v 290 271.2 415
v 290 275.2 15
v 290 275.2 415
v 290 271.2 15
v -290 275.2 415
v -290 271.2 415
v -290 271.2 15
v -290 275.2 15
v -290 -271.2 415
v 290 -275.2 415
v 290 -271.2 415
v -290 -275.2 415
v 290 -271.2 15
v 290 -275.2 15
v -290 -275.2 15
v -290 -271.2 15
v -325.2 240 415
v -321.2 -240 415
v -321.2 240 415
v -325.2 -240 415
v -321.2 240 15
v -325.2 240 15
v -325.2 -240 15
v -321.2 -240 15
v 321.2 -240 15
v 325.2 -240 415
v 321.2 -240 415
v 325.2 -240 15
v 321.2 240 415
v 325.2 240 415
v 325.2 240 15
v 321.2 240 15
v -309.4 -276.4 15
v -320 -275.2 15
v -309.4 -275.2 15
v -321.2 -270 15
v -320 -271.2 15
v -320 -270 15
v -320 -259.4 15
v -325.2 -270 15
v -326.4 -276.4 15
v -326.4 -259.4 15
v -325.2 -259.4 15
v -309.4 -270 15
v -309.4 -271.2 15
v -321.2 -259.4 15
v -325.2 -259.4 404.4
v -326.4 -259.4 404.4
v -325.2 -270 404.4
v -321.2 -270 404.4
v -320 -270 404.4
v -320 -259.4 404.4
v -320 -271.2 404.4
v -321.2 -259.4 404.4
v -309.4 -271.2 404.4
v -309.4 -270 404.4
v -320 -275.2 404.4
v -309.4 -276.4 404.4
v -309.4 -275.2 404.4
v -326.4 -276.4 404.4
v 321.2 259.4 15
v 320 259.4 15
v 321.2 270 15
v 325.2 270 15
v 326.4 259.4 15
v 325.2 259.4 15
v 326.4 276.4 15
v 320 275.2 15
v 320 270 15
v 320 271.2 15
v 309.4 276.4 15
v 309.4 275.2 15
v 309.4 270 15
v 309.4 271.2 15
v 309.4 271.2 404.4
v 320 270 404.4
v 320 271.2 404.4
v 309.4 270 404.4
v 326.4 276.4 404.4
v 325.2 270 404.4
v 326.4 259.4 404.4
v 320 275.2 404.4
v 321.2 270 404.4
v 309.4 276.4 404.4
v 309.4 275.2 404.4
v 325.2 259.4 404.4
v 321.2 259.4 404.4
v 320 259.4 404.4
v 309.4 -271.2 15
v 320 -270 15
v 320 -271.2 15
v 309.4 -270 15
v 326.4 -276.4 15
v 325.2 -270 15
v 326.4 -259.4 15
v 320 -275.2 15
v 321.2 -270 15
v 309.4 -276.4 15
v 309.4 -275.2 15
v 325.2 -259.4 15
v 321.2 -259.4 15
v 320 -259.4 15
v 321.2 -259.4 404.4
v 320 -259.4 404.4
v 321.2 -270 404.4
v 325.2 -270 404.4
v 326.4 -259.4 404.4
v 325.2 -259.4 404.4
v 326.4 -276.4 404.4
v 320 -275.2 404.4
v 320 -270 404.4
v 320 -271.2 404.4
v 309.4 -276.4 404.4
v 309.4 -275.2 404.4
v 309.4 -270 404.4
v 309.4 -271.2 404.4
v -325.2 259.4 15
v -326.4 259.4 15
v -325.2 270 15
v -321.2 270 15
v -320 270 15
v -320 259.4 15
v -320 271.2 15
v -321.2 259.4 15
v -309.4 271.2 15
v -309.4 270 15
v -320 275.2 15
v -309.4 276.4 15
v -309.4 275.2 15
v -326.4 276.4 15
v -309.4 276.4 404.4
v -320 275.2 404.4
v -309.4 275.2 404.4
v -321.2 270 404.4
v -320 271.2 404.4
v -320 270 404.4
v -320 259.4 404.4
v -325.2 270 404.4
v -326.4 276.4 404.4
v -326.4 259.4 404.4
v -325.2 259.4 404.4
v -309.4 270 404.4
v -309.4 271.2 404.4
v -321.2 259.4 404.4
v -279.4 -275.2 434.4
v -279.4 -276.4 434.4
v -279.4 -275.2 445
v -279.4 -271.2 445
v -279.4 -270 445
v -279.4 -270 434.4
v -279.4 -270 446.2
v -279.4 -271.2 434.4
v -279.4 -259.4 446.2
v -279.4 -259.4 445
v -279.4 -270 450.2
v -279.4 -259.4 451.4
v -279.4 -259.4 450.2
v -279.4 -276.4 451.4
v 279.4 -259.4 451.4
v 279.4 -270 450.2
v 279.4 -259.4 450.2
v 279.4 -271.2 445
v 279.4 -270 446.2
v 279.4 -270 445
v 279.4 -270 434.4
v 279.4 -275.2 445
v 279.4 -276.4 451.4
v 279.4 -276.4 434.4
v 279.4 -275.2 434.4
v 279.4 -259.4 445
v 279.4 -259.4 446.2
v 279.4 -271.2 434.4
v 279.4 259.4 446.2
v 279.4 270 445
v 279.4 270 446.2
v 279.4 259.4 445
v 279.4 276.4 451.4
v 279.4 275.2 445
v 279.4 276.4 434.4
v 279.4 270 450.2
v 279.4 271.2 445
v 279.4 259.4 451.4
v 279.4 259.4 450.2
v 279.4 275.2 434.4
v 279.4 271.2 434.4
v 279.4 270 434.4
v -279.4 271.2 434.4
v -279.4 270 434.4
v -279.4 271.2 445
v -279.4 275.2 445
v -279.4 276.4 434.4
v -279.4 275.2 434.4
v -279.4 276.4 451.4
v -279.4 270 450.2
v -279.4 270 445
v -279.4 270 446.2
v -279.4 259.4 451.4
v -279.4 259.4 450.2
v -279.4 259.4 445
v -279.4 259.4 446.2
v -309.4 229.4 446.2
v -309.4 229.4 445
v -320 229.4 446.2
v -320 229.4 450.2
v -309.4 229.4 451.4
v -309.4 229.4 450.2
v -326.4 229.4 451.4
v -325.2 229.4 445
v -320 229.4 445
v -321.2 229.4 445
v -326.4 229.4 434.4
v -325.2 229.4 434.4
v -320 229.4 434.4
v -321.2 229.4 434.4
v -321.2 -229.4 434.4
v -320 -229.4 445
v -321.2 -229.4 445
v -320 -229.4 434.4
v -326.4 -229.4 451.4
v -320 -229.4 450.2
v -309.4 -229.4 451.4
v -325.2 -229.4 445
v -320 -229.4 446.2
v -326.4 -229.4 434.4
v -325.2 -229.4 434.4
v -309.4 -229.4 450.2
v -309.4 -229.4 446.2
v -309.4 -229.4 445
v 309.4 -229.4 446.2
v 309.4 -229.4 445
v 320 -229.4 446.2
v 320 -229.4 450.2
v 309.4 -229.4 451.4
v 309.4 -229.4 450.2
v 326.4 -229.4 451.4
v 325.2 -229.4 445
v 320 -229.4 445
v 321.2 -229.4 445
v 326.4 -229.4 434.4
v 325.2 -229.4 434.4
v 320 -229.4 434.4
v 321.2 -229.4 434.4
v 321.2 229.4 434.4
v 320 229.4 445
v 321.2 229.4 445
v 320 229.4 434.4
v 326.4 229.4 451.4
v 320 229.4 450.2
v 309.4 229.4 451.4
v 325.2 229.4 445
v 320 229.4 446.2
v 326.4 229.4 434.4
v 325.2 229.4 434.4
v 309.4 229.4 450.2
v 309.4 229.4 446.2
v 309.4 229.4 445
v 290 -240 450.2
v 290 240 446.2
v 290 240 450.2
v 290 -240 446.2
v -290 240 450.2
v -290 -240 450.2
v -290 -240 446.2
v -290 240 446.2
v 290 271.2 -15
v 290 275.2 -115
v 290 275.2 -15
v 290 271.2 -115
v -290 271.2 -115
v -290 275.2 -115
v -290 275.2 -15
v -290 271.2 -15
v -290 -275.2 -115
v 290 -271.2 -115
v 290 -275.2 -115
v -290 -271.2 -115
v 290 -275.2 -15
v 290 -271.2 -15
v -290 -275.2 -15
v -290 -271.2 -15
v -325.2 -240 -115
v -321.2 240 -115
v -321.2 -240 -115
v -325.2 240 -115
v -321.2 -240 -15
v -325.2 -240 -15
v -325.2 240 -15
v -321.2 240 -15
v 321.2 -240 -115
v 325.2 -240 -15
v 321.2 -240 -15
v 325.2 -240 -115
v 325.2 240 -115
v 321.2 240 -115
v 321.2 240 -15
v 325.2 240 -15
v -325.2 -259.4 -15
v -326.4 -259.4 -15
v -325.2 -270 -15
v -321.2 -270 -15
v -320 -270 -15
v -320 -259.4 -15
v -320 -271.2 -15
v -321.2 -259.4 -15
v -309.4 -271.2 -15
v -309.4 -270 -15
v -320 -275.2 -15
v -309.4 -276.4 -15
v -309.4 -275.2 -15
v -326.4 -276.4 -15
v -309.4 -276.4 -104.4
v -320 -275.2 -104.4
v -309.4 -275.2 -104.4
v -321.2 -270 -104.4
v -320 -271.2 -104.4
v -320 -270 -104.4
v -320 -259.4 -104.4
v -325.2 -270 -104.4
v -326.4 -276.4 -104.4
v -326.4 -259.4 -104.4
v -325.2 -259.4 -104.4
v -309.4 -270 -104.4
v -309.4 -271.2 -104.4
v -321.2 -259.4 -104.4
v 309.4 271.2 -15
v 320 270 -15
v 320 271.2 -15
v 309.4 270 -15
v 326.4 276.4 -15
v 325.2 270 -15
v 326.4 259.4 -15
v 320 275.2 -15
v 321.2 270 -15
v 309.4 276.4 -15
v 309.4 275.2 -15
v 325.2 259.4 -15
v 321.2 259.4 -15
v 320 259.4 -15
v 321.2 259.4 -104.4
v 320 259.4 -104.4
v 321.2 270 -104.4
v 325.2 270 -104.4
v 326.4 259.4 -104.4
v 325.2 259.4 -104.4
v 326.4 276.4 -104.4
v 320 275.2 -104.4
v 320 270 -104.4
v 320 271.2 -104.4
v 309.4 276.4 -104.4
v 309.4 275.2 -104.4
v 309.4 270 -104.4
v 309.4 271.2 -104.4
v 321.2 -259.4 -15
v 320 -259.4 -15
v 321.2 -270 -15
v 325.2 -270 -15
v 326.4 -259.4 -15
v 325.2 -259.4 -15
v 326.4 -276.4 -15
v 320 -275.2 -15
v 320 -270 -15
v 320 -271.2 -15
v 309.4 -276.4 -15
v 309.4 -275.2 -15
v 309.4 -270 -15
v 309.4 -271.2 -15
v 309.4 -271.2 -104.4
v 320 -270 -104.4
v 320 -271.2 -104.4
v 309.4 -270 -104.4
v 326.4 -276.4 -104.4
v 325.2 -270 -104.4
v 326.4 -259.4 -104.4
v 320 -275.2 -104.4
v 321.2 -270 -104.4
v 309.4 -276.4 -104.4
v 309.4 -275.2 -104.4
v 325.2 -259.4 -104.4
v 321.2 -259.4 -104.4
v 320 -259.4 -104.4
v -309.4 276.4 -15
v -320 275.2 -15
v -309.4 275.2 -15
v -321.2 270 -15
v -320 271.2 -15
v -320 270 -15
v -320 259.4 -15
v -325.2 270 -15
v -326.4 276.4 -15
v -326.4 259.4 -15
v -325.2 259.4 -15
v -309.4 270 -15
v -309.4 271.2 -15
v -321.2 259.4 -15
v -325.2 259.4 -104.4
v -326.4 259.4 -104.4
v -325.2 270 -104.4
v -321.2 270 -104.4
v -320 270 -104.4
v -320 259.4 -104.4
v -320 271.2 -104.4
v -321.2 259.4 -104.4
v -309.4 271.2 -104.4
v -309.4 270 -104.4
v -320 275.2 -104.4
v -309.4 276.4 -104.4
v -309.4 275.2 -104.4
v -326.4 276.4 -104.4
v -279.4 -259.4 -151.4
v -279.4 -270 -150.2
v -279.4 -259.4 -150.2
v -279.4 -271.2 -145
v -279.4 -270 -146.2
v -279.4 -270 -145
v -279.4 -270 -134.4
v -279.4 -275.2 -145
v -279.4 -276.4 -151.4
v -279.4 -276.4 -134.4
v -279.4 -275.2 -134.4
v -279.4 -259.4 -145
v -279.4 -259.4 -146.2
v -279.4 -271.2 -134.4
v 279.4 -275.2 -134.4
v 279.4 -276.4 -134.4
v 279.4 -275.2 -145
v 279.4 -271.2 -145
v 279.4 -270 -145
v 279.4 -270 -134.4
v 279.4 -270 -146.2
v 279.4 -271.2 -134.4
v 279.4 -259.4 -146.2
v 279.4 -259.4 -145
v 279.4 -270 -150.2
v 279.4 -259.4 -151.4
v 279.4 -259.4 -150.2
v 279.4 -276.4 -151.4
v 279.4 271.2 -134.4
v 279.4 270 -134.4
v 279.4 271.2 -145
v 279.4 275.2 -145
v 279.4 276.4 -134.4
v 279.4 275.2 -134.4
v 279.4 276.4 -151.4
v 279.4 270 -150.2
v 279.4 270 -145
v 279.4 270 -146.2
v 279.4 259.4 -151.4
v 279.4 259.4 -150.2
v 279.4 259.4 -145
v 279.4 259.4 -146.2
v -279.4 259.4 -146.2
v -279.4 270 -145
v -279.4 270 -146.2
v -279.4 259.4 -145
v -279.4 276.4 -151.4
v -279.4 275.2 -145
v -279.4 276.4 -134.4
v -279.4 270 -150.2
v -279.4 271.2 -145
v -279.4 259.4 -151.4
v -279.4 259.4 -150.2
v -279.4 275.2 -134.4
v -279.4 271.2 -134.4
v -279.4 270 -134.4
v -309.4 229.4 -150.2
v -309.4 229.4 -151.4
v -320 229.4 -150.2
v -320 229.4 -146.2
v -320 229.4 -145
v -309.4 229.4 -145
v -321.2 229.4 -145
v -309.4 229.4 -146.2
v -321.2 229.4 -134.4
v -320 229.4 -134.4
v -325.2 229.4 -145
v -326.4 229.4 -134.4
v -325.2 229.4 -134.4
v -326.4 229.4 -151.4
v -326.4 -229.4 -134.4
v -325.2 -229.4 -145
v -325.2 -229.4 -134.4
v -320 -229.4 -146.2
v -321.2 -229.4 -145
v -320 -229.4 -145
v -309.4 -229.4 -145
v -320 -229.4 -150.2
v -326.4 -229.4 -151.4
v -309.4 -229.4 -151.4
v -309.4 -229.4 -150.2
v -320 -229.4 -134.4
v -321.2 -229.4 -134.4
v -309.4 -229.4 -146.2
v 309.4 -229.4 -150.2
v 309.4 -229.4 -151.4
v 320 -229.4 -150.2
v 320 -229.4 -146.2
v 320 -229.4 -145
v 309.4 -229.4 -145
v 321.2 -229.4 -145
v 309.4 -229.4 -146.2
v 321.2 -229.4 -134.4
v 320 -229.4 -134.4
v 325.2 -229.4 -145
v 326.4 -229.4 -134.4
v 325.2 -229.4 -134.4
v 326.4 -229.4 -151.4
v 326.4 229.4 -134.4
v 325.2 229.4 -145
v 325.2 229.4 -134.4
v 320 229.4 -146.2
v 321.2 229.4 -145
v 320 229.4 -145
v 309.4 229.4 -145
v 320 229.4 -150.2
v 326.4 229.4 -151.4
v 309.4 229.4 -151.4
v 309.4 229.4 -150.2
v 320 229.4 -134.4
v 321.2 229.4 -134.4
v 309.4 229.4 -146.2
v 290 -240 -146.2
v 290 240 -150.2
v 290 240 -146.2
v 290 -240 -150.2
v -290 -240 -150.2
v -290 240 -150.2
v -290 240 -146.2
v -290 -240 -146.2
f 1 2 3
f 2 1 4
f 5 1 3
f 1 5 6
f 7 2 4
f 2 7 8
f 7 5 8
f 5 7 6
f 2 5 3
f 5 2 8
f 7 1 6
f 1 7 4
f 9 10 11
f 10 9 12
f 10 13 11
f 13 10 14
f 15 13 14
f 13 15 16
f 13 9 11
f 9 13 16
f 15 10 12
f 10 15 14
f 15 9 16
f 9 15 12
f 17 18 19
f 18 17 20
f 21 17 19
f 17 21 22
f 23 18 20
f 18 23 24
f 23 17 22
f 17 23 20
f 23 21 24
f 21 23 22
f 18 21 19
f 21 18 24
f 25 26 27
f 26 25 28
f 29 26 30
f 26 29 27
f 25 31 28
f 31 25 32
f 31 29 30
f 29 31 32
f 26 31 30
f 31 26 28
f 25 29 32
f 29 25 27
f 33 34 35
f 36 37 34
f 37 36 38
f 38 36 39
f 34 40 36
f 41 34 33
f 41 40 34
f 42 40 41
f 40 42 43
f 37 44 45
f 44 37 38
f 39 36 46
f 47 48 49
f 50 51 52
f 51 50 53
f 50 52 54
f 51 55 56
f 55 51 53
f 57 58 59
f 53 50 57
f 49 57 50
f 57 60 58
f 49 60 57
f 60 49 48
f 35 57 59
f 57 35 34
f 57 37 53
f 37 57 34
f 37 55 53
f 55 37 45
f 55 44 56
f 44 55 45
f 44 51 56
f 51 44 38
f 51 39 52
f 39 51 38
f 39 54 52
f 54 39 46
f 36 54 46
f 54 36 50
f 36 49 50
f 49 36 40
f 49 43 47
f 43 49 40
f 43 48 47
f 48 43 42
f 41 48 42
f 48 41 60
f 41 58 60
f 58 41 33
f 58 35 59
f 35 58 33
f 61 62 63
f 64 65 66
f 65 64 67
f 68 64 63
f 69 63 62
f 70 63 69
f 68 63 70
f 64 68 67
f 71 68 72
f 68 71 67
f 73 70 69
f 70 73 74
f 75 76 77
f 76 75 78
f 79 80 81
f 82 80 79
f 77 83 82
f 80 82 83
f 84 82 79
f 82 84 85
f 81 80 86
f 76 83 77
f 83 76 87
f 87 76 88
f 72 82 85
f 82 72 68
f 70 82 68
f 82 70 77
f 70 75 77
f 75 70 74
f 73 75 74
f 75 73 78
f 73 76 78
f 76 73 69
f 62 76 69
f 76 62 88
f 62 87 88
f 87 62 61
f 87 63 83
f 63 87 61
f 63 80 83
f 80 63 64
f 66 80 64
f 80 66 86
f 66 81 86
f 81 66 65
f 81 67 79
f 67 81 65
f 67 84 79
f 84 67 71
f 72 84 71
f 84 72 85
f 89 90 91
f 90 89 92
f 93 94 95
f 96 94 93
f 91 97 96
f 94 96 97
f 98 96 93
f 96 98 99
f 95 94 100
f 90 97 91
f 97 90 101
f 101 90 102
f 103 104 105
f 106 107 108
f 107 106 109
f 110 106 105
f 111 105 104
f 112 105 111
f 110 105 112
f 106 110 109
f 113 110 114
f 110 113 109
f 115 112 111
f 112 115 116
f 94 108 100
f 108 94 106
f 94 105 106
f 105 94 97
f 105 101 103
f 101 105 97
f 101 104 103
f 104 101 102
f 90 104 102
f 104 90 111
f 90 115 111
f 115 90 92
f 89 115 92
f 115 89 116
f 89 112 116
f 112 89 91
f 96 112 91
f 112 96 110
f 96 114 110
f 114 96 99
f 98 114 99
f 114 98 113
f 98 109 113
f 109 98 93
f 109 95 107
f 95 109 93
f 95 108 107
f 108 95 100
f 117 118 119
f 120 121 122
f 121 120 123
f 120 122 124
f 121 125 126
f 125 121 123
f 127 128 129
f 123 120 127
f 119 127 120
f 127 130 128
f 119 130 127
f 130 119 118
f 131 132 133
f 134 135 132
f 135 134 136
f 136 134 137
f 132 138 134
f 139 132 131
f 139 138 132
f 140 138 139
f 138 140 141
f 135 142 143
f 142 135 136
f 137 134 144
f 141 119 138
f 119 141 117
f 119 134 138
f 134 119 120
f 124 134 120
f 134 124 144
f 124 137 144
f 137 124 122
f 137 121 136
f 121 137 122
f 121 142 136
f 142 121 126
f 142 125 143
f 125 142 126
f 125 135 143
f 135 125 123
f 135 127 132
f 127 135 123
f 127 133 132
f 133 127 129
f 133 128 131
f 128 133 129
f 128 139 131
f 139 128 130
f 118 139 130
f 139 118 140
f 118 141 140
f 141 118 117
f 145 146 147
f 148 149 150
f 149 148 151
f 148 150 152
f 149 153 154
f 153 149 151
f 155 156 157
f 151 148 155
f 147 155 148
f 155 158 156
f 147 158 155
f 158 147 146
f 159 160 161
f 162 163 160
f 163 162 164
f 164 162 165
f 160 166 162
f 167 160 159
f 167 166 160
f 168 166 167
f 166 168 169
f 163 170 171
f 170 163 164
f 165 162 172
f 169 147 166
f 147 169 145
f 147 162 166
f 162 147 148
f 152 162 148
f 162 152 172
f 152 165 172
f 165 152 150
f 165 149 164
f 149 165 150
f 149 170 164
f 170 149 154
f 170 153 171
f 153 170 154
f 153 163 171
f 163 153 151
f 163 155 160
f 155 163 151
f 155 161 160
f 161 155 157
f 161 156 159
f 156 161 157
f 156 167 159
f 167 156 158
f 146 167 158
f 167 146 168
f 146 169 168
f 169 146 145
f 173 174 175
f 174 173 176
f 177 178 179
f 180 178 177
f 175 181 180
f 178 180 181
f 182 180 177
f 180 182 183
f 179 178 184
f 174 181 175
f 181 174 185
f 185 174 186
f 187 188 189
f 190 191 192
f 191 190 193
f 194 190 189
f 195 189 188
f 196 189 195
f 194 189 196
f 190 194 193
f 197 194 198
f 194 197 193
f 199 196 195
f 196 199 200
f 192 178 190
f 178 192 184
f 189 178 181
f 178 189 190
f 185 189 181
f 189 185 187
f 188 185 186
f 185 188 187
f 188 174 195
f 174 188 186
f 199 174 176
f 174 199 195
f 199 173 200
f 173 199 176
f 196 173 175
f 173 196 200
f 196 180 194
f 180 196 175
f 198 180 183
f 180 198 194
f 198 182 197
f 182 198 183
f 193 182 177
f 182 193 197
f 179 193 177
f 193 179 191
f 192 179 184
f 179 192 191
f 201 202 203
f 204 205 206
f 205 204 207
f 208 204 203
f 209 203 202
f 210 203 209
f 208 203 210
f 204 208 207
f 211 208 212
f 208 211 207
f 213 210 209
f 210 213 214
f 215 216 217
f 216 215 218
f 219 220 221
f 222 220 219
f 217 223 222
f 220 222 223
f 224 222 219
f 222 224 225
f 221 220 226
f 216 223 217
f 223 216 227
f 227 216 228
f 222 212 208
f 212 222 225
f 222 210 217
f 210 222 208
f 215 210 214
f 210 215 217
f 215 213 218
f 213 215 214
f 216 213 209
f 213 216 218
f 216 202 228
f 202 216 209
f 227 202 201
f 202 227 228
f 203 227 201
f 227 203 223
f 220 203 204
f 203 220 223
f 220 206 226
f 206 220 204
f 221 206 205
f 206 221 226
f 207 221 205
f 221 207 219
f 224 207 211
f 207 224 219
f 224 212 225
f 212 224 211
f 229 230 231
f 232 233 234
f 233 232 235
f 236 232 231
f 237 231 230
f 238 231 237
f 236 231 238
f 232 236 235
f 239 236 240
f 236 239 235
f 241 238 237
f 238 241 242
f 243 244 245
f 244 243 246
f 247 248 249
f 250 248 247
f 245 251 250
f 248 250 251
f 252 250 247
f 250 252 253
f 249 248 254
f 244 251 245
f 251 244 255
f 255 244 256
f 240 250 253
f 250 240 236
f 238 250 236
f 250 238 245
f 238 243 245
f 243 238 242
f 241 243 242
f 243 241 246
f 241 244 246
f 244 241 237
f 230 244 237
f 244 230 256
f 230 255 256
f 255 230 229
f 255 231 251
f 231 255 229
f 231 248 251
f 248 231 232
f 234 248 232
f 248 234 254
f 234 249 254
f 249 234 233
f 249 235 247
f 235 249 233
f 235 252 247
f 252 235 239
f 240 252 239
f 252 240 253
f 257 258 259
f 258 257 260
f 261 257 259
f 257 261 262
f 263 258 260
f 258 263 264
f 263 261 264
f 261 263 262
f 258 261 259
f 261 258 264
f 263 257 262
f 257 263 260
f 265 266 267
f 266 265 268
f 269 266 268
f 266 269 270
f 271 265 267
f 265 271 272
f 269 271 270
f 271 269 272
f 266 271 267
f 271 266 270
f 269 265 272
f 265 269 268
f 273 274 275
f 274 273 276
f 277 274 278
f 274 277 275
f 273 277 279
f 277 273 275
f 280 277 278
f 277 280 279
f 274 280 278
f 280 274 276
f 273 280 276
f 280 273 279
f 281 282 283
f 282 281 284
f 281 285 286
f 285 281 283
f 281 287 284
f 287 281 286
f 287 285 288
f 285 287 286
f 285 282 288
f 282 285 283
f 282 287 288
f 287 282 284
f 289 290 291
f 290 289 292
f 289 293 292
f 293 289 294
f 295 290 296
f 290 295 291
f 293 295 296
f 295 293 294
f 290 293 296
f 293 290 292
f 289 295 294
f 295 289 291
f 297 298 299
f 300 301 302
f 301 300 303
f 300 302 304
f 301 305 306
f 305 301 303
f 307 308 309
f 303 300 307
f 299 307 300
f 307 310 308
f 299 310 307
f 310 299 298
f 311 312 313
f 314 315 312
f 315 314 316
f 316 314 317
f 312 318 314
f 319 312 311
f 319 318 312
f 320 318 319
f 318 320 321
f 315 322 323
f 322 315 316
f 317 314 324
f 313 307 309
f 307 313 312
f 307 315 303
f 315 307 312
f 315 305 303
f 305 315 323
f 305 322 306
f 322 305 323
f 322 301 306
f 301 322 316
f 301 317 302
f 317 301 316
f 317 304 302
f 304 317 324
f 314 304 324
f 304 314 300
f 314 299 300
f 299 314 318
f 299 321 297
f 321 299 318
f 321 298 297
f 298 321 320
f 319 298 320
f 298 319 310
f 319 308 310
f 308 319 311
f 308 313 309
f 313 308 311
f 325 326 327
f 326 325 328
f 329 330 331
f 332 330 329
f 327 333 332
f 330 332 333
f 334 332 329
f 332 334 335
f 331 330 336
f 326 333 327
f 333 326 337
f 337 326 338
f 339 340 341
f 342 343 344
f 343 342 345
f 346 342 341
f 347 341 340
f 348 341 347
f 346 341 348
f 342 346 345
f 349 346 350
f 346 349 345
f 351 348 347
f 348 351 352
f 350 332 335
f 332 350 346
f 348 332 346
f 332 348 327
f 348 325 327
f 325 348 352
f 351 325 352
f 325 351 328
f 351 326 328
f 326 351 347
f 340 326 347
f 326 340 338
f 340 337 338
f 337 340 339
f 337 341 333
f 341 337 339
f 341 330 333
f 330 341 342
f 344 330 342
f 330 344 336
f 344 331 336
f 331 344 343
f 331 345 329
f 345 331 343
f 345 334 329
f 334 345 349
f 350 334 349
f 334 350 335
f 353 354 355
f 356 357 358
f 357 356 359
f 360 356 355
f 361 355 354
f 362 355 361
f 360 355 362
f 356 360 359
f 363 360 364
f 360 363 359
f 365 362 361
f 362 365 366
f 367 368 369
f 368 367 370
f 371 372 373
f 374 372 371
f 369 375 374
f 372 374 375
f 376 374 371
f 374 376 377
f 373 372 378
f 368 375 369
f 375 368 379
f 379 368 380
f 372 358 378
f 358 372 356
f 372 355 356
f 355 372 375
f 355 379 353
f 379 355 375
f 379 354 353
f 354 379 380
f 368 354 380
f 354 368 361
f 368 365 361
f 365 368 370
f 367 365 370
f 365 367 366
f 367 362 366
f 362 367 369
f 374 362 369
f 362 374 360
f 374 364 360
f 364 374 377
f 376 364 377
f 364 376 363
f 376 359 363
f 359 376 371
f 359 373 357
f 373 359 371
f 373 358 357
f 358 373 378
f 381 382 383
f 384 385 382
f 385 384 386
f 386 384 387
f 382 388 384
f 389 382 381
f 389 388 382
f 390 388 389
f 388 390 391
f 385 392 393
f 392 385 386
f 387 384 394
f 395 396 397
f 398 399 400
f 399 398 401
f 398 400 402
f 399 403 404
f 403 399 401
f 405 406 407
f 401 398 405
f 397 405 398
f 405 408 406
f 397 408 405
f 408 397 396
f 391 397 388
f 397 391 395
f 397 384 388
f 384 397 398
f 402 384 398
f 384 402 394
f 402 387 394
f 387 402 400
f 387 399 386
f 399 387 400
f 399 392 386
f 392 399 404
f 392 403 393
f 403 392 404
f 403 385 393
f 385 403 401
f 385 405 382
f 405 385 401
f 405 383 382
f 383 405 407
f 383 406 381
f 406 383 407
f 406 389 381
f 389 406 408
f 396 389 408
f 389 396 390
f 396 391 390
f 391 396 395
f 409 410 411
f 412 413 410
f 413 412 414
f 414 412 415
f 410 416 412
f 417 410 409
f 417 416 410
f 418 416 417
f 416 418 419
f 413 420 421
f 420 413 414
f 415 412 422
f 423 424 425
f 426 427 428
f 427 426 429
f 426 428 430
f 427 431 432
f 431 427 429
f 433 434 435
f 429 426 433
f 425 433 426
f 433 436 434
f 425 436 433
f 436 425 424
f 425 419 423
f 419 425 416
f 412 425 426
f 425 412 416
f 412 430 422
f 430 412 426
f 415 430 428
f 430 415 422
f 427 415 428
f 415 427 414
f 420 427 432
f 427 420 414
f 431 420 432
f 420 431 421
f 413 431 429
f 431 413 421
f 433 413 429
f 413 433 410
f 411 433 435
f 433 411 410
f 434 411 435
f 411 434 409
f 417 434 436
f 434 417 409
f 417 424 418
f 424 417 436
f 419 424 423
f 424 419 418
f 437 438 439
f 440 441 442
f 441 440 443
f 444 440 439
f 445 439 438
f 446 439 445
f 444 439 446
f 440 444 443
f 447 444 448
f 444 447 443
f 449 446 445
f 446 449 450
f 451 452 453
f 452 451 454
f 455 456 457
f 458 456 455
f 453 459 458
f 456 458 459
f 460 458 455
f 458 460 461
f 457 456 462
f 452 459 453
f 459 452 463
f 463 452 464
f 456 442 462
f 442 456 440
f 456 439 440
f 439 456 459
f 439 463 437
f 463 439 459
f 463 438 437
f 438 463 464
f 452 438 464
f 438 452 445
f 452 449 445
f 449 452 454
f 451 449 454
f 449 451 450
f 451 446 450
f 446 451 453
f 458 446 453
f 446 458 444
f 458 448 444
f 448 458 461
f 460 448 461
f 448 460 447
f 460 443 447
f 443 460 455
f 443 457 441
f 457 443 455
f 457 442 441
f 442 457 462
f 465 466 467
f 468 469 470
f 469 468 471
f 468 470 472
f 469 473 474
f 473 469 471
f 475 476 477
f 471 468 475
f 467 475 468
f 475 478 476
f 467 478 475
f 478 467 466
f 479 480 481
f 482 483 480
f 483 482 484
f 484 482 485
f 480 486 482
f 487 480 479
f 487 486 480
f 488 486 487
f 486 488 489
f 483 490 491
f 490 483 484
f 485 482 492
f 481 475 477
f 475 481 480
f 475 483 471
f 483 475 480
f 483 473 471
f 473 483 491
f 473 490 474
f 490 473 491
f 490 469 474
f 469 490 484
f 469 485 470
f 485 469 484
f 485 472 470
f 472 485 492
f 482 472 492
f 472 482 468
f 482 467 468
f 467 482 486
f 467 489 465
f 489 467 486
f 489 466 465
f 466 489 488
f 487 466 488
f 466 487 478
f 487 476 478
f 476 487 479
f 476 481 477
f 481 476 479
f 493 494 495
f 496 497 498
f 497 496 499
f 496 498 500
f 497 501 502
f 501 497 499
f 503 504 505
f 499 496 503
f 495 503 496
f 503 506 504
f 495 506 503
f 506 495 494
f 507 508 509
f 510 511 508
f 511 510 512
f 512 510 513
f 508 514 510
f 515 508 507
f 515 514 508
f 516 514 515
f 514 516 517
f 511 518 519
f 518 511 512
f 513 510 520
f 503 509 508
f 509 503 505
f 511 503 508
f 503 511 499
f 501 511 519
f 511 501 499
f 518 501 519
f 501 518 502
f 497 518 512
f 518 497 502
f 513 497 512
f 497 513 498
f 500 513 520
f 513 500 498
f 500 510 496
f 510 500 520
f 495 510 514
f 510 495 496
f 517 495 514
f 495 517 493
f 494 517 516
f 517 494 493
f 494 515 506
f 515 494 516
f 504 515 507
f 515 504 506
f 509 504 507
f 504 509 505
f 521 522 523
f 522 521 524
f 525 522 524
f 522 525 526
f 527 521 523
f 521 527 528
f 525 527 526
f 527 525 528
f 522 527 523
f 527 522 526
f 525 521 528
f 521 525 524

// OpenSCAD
//**** Deklaration
//Innenmasse in mm
base_height = 100;  // Höhe in mm
lid_height = 400;   // Höhe in mm
length = 480;       //Länge innenmaß in mm
width = 580;        //Breite innenmaß in mm
explode = 30;       //Abstand für Explosionsansicht
//Plattendicke wird im Aluprofil definiert

//****Profildeklaration
//Profiltypen ohne Gewähr
//profil=[Profilname, Schenkellänge, Einschubtiefe, Materialstärke, Einschubbreite = Dicke der Platten]

profil=["Adam Hall 6136",17,10.6,1.2,4];
//profil=["AdamHall 6137",18,11.1,1.2,4.5];
//profil=["AdamHaLL6129",22,12,1.5,7];
//profil=["AdamHaLL6106",30,20,1.5,7];
//profil=["AdamHaLL6107",30,17,1.5,9.5];
//profil=["AdamHaLL6119",30,16,1.5,10];

//****Deklaration ENDE


//kalkulationen und umwandlungen um den Code besser lesbar zu halten
schenkellength = profil[1];         // Schenkellänge in mm
reduction = profil[2];              //Einschubtiefe
materialthickness = profil[3];      // Materialstärke in mm
thickness = profil[4];              // Dicke in mm (4mm)
profiloffset = schenkellength - reduction; //offset für Profile
walloffset = profiloffset - materialthickness - thickness; //offset für Platten


//Aluprofil erstellen
module casemaker(height){
    strecke = [0,materialthickness,materialthickness+thickness,materialthickness*2+thickness,schenkellength];
    color("blue", 0.4) linear_extrude(height, convexity=10) polygon([
        [strecke[0], strecke[0]],
        [strecke[4], strecke[0]],
        [strecke[4], strecke[1]],
        [profiloffset, strecke[1]],//strecke[3]
        [profiloffset, strecke[2]],//strecke[3]
        [strecke[4], strecke[2]],
        [strecke[4], strecke[3]],
        [strecke[3], strecke[3]],
        [strecke[3], strecke[4]],
        [strecke[2], strecke[4]],
        [strecke[2], profiloffset],//strecke[3]
        [strecke[1], profiloffset],//strecke[3]
        [strecke[1], strecke[4]],
        [strecke[0], strecke[4]]
    ]);   
    echo(str("Aluprofil vom Typ: ",profil[0]," in der Länge ",height,"mm"));
}


module walls( height, explode)
    {
    for(i=[0,180]) rotate([0,0,i]) translate([0,length/2 + thickness/2 + explode, height/2]) cube([width,thickness,height], center = true);
    echo(str("2x Front: LxHxT ",width,"x",height,"x",thickness,"mm"));
    for(i=[90,270]) rotate([0,0,i]) translate([0,width/2 + thickness/2 + explode, height/2]) cube([length,thickness,height], center = true);
    echo(str("2x Seite: LxHxT ",length,"x",height,"x",thickness,"mm"));
    }
module lid(height, explode)
    {
    translate([0,0,height + thickness/2 + explode]) cube([width,length,thickness], center = true);
    echo(str("1x Deckplatte: LxHxT ",width,"x",length,"x",thickness,"mm"));
    }
module wall_profile(height, explode){
    for(i = [0,180]) rotate([0,0,i]) translate([-width/2 - explode,-length/2 - explode,0])casemaker(height-reduction);
    for(i = [90,270]) rotate([0,0,i]) translate([-length/2 - explode,-width/2 - explode,0])casemaker(height-reduction);
    }
module lid_profile(height, explode){
    for (i = [0,180])rotate([i,90,0]) translate([-(height + explode), - (length/2 + explode), -width/2 + reduction]) casemaker(width-reduction*2);
    for (i = [90,270])rotate([i,90,0]) translate([-(height + explode), - (width/2 + explode), -length/2 + reduction]) casemaker(length-reduction*2);
    }
    
module create_half_flightcase(height){    
    walls       (height, explode + walloffset);
    lid         (height, explode + walloffset);
    wall_profile(height, explode + profiloffset);
    lid_profile (height, explode + profiloffset);
}
echo(str("Beginne Shoppingliste Teil 1"));
translate([0,0,explode/2]) create_half_flightcase(lid_height);
echo(str("Beginne Shoppingliste Teil 2"));
mirror([0,0,1]) translate([0,0,explode/2]) create_half_flightcase(base_height);
echo(str("Alle Angaben ohne Gewähr"));
